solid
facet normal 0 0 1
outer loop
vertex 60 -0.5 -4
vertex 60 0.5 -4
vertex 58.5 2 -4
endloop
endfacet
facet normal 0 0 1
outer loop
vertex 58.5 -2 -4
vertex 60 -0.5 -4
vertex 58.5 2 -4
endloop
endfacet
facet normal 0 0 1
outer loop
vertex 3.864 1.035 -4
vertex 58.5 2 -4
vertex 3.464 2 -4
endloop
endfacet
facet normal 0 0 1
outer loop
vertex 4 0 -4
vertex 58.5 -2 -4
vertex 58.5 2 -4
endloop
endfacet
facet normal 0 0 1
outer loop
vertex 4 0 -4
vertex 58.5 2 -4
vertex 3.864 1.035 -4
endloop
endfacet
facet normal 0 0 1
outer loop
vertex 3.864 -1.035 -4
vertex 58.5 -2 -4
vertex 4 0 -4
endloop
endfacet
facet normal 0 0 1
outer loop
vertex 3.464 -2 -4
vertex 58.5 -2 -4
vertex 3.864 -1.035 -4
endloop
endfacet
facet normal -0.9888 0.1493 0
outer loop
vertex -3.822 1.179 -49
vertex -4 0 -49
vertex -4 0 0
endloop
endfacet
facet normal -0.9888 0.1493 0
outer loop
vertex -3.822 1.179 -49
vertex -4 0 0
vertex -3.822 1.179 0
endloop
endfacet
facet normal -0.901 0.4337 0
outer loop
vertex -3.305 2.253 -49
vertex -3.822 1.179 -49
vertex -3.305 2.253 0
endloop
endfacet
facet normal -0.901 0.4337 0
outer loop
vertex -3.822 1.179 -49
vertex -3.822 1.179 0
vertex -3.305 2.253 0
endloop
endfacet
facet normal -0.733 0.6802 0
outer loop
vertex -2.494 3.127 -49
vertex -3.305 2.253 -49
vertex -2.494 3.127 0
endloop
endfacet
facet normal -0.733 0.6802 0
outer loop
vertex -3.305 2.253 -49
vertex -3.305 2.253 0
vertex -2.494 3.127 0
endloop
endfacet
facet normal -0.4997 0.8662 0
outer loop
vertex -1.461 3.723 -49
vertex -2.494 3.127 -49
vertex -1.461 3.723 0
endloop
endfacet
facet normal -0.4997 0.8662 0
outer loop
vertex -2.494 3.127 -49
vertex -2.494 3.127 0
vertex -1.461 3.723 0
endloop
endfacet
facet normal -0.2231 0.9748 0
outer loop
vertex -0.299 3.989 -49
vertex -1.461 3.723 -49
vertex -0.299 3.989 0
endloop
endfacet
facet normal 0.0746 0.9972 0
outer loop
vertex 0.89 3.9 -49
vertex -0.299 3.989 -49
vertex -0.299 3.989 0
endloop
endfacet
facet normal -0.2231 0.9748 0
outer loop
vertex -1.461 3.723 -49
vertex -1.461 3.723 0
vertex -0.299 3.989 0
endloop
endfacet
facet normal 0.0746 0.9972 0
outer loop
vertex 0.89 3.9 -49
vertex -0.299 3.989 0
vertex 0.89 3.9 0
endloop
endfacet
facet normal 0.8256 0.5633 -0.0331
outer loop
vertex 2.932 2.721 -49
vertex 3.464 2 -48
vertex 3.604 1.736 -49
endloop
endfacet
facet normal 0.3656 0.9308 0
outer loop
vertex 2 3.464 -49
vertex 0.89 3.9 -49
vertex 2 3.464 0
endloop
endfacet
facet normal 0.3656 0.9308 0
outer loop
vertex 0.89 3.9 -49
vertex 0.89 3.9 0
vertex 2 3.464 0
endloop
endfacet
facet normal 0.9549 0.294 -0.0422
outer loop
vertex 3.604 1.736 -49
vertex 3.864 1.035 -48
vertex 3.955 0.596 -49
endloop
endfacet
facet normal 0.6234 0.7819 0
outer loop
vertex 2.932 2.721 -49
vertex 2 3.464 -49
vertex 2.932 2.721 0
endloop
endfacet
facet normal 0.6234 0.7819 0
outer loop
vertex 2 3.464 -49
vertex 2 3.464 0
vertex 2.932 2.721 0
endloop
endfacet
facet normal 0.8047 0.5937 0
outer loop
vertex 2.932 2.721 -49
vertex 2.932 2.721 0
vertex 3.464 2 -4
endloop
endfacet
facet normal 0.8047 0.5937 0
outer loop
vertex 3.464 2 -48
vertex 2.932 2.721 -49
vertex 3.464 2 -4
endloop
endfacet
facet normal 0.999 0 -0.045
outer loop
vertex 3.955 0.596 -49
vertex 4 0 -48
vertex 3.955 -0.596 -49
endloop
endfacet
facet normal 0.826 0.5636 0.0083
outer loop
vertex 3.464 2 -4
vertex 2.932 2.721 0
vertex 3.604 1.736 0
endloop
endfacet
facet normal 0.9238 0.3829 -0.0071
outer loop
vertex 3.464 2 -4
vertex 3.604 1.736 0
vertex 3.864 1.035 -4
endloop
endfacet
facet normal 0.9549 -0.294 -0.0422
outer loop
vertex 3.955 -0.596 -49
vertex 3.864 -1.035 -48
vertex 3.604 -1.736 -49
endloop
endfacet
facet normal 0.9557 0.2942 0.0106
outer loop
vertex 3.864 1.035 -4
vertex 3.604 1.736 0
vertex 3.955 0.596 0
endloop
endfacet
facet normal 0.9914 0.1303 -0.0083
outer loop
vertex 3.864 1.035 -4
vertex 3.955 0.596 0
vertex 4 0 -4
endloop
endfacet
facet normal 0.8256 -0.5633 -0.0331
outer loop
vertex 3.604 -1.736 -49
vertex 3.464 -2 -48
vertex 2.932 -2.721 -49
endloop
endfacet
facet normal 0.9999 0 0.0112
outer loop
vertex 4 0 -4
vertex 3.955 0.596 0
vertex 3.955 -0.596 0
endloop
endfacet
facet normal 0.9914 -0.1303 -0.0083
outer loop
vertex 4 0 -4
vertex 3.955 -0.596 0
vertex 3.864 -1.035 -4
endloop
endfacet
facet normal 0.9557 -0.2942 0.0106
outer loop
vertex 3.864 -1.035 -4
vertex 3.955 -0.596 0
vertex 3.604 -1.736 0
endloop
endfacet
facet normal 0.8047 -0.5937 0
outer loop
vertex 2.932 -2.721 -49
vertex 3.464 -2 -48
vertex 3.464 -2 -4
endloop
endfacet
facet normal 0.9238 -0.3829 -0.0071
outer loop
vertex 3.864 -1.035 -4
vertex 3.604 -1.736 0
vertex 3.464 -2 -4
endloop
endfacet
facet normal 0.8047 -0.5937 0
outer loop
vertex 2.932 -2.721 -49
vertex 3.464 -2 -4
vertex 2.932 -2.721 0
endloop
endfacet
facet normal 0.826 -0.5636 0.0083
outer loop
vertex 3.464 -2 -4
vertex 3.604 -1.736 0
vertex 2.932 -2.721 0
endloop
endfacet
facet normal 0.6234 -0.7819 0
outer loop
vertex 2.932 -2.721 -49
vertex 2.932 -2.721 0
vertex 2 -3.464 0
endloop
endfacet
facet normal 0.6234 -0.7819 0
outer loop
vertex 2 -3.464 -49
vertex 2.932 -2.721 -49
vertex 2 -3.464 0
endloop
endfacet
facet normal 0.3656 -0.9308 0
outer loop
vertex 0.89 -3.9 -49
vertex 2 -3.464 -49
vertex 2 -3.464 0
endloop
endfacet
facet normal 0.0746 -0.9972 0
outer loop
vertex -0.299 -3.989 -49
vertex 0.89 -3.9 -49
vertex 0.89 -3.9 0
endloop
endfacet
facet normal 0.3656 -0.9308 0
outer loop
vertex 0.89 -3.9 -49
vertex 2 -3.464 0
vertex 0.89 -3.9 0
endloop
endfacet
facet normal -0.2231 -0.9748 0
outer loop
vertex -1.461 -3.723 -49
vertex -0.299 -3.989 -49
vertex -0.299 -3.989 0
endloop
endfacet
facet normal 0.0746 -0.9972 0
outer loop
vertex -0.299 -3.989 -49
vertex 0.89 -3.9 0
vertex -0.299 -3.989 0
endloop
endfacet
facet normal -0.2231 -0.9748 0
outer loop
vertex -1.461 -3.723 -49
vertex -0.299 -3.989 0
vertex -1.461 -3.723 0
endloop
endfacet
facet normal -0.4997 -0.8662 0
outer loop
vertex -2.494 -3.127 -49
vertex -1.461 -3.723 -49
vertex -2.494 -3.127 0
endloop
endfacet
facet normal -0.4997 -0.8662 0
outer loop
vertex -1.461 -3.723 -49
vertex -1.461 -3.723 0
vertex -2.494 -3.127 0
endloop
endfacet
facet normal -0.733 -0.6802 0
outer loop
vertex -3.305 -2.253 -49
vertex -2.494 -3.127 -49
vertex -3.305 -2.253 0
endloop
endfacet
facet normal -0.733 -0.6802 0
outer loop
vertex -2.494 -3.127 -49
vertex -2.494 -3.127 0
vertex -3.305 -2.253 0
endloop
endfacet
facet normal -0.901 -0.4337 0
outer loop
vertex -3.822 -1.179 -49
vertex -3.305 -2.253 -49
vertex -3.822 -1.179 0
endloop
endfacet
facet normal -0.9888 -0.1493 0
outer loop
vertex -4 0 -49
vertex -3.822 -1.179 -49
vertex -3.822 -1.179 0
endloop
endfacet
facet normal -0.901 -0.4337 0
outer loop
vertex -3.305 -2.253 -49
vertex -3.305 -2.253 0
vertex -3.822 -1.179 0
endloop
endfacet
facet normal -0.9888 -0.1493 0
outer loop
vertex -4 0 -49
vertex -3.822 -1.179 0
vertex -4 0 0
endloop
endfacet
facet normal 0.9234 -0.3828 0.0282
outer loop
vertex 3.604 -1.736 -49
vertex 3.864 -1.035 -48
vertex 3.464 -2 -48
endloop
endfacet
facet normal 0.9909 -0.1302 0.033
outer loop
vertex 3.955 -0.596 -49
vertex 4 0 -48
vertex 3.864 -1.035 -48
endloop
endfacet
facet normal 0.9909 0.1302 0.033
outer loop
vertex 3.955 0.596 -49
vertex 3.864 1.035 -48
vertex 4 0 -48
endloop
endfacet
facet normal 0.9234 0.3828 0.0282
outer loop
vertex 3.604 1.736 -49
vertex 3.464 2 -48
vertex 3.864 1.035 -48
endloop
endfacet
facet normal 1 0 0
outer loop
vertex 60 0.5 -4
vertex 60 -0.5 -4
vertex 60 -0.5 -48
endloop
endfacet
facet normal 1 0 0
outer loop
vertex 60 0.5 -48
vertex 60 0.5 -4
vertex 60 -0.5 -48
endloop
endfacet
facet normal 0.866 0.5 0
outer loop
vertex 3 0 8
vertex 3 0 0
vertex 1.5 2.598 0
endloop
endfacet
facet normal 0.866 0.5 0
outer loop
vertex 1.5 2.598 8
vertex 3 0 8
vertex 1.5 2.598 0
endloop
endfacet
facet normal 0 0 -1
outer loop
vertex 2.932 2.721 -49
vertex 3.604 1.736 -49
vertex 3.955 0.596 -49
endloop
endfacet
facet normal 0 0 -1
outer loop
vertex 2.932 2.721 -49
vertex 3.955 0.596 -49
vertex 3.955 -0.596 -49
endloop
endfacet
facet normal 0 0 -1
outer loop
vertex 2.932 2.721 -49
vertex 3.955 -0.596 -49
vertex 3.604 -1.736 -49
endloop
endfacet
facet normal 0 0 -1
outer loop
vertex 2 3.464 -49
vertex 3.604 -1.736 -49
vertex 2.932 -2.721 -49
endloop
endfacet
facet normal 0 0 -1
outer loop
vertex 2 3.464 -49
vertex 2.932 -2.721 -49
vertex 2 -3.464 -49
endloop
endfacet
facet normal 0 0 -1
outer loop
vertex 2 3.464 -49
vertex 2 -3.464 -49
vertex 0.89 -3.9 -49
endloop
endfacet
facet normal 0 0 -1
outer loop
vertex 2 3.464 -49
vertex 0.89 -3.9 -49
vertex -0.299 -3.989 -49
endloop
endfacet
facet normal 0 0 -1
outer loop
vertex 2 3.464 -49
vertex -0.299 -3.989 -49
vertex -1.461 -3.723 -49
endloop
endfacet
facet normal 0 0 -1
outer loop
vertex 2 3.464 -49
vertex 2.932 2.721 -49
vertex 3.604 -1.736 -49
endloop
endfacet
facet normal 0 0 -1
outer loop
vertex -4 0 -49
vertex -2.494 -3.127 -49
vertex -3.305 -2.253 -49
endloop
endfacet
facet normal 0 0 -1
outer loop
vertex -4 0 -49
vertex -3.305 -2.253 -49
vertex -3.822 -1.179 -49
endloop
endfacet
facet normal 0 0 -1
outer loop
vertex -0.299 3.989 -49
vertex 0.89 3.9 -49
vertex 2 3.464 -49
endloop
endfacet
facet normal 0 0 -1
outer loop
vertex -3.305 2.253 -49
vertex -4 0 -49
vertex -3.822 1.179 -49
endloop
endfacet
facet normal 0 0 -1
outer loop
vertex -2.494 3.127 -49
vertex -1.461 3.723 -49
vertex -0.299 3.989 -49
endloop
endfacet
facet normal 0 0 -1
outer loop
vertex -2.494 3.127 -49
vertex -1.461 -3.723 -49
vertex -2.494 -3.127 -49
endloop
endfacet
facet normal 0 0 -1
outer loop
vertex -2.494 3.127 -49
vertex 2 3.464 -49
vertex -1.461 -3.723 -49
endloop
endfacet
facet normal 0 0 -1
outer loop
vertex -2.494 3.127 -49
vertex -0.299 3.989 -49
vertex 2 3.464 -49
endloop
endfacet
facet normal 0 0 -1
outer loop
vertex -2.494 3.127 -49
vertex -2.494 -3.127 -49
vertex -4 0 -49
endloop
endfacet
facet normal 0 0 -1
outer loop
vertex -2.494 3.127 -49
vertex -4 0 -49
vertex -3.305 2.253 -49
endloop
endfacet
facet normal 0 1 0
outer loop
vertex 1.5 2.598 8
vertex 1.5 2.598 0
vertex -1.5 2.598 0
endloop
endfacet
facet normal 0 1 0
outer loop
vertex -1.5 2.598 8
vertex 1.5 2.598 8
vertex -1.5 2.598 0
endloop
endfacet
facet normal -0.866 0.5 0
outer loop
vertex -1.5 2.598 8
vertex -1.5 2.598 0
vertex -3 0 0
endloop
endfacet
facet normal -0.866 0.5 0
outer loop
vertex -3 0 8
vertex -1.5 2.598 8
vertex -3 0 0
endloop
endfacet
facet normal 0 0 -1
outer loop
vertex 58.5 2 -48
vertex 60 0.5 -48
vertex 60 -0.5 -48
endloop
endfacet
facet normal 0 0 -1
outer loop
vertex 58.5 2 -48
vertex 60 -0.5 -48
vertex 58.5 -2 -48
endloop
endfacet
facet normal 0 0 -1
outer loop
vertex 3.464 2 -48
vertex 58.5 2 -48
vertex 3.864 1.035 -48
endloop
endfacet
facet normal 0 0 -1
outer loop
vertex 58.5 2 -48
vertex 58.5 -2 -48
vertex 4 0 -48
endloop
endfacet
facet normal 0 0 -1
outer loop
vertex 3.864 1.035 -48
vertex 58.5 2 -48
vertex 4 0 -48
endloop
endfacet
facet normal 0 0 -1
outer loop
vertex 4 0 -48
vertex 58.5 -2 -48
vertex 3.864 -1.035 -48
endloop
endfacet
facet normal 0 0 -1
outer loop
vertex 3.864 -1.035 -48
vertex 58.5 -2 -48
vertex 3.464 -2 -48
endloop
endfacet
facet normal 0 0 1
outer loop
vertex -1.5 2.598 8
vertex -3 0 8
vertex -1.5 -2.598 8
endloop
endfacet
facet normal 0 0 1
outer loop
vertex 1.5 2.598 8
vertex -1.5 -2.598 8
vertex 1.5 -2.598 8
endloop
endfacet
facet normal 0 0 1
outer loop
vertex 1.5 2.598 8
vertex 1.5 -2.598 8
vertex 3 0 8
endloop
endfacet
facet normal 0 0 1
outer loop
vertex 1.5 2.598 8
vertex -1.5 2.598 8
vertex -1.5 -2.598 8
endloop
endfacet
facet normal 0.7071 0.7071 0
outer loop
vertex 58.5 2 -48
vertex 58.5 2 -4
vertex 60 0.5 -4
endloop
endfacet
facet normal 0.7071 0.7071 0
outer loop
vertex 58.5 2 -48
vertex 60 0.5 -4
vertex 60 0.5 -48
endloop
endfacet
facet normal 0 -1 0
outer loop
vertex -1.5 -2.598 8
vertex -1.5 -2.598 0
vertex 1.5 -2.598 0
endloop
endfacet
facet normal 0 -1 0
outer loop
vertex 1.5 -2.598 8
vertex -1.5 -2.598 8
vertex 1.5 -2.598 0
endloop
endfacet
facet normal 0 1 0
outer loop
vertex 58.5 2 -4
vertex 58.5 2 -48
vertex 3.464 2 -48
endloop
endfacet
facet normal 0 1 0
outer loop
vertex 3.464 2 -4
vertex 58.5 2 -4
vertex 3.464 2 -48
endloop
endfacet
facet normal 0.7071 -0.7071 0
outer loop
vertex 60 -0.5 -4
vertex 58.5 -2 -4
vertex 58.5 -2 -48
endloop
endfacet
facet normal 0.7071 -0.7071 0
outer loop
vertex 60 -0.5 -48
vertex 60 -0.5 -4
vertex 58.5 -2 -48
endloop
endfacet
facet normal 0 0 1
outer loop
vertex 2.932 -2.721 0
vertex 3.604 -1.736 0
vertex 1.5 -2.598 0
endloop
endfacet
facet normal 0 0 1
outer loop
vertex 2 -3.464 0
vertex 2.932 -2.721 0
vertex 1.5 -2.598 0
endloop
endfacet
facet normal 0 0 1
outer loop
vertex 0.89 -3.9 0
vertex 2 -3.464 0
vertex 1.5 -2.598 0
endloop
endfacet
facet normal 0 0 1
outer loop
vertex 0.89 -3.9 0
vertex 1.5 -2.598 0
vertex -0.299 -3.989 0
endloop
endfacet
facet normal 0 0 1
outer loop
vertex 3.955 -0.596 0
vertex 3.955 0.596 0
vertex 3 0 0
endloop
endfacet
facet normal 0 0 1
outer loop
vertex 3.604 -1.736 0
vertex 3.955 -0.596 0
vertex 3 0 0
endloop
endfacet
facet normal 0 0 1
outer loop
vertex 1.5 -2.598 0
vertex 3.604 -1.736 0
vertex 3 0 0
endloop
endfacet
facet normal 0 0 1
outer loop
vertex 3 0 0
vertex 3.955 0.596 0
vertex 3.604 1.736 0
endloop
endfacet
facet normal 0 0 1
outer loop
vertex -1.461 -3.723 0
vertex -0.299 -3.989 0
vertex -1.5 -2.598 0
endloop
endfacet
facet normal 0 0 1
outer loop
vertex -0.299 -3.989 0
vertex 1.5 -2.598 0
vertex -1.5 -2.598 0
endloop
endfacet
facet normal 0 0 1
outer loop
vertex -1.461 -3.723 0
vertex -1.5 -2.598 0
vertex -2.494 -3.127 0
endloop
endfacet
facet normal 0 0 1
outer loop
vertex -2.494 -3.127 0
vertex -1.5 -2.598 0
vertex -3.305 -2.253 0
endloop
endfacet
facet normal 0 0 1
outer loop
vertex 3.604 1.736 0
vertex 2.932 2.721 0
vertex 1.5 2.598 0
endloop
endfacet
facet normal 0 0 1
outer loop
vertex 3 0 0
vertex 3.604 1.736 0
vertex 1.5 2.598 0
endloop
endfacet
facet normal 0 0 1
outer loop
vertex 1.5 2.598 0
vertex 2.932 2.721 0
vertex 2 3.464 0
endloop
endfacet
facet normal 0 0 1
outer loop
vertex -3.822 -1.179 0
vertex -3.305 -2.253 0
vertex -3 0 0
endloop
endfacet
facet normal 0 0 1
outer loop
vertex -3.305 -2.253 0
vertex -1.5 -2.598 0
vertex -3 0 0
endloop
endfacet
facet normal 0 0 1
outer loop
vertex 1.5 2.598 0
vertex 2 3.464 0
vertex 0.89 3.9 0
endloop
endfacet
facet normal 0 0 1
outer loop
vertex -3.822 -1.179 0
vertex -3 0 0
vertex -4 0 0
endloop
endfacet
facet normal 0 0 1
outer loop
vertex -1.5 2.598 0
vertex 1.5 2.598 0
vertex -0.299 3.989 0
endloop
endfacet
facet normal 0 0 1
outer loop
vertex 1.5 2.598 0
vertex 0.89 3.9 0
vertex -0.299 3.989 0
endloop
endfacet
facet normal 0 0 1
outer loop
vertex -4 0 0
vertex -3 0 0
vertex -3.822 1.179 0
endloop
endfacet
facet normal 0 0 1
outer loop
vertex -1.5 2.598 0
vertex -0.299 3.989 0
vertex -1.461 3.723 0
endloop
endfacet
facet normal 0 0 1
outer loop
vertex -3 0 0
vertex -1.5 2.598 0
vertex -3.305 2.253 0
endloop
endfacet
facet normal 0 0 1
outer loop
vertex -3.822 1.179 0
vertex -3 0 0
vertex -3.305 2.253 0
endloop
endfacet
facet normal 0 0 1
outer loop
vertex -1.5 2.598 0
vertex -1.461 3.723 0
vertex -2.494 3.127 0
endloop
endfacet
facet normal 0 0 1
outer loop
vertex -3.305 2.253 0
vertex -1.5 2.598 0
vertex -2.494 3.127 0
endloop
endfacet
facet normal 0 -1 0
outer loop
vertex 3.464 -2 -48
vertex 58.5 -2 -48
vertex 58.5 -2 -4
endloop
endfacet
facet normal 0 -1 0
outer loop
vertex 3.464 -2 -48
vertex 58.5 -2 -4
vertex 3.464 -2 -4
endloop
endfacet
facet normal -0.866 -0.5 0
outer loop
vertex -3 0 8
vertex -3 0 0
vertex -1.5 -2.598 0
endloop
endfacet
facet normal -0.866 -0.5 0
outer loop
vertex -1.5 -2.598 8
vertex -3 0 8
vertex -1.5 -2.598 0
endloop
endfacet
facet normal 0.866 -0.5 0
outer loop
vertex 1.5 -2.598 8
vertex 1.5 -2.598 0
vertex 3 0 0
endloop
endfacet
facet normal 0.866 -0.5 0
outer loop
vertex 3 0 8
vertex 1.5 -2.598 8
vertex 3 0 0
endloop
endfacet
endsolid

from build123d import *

# Parameters (mm, degrees)
SKETCH017_W               = 60
SKETCH017_H               = 44
EXTRUDE021_DEPTH          = 2
CHAMFER001_SIZE           = 1.5
EXTRUDE024_DEPTH          = 8
SKETCH016_R               = 4
EXTRUDE020_DEPTH          = 49
FUSION008_PLACEMENT_ANGLE = 180


with BuildPart() as chamfer001:
    # Sketch017 (on Extrude) → Extrude021 (new body, symmetric)
    with BuildSketch(Plane.XZ):
        with Locations((-30, 26)):
            Rectangle(SKETCH017_W, SKETCH017_H)
    extrude(amount=EXTRUDE021_DEPTH, both=True)

    # Chamfer001
    chamfer001_edges = [chamfer001.edges().sort_by_distance(p)[0] for p in [
        (-60, 2, 26),
        (-60, -2, 26),
    ]]
    chamfer(chamfer001_edges, length=CHAMFER001_SIZE)


with BuildPart() as extrude024:
    # Sketch019 → Extrude024 (new body)
    with BuildSketch(Plane.XY):
        Polygon((-1.5, 2.598076), (1.5, 2.598076), (3, 0), (1.5, -2.598076), (-1.5, -2.598076), (-3, 0), align=None)
    extrude(amount=-EXTRUDE024_DEPTH)


with BuildPart() as reject_flap:
    # Sketch016 → Extrude020 (new body)
    with BuildSketch(Plane.XY):
        Circle(SKETCH016_R)
    extrude(amount=EXTRUDE020_DEPTH)

    # Fusion008: union Chamfer001, Extrude024
    add(chamfer001.part)
    add(extrude024.part)


with BuildPart() as reject_flap_1:
    # Fusion008 placement: moved
    add(reject_flap.part.rotate(Axis((0, 0, 0), (0, 1, 0)), FUSION008_PLACEMENT_ANGLE))


solid = reject_flap_1.part
